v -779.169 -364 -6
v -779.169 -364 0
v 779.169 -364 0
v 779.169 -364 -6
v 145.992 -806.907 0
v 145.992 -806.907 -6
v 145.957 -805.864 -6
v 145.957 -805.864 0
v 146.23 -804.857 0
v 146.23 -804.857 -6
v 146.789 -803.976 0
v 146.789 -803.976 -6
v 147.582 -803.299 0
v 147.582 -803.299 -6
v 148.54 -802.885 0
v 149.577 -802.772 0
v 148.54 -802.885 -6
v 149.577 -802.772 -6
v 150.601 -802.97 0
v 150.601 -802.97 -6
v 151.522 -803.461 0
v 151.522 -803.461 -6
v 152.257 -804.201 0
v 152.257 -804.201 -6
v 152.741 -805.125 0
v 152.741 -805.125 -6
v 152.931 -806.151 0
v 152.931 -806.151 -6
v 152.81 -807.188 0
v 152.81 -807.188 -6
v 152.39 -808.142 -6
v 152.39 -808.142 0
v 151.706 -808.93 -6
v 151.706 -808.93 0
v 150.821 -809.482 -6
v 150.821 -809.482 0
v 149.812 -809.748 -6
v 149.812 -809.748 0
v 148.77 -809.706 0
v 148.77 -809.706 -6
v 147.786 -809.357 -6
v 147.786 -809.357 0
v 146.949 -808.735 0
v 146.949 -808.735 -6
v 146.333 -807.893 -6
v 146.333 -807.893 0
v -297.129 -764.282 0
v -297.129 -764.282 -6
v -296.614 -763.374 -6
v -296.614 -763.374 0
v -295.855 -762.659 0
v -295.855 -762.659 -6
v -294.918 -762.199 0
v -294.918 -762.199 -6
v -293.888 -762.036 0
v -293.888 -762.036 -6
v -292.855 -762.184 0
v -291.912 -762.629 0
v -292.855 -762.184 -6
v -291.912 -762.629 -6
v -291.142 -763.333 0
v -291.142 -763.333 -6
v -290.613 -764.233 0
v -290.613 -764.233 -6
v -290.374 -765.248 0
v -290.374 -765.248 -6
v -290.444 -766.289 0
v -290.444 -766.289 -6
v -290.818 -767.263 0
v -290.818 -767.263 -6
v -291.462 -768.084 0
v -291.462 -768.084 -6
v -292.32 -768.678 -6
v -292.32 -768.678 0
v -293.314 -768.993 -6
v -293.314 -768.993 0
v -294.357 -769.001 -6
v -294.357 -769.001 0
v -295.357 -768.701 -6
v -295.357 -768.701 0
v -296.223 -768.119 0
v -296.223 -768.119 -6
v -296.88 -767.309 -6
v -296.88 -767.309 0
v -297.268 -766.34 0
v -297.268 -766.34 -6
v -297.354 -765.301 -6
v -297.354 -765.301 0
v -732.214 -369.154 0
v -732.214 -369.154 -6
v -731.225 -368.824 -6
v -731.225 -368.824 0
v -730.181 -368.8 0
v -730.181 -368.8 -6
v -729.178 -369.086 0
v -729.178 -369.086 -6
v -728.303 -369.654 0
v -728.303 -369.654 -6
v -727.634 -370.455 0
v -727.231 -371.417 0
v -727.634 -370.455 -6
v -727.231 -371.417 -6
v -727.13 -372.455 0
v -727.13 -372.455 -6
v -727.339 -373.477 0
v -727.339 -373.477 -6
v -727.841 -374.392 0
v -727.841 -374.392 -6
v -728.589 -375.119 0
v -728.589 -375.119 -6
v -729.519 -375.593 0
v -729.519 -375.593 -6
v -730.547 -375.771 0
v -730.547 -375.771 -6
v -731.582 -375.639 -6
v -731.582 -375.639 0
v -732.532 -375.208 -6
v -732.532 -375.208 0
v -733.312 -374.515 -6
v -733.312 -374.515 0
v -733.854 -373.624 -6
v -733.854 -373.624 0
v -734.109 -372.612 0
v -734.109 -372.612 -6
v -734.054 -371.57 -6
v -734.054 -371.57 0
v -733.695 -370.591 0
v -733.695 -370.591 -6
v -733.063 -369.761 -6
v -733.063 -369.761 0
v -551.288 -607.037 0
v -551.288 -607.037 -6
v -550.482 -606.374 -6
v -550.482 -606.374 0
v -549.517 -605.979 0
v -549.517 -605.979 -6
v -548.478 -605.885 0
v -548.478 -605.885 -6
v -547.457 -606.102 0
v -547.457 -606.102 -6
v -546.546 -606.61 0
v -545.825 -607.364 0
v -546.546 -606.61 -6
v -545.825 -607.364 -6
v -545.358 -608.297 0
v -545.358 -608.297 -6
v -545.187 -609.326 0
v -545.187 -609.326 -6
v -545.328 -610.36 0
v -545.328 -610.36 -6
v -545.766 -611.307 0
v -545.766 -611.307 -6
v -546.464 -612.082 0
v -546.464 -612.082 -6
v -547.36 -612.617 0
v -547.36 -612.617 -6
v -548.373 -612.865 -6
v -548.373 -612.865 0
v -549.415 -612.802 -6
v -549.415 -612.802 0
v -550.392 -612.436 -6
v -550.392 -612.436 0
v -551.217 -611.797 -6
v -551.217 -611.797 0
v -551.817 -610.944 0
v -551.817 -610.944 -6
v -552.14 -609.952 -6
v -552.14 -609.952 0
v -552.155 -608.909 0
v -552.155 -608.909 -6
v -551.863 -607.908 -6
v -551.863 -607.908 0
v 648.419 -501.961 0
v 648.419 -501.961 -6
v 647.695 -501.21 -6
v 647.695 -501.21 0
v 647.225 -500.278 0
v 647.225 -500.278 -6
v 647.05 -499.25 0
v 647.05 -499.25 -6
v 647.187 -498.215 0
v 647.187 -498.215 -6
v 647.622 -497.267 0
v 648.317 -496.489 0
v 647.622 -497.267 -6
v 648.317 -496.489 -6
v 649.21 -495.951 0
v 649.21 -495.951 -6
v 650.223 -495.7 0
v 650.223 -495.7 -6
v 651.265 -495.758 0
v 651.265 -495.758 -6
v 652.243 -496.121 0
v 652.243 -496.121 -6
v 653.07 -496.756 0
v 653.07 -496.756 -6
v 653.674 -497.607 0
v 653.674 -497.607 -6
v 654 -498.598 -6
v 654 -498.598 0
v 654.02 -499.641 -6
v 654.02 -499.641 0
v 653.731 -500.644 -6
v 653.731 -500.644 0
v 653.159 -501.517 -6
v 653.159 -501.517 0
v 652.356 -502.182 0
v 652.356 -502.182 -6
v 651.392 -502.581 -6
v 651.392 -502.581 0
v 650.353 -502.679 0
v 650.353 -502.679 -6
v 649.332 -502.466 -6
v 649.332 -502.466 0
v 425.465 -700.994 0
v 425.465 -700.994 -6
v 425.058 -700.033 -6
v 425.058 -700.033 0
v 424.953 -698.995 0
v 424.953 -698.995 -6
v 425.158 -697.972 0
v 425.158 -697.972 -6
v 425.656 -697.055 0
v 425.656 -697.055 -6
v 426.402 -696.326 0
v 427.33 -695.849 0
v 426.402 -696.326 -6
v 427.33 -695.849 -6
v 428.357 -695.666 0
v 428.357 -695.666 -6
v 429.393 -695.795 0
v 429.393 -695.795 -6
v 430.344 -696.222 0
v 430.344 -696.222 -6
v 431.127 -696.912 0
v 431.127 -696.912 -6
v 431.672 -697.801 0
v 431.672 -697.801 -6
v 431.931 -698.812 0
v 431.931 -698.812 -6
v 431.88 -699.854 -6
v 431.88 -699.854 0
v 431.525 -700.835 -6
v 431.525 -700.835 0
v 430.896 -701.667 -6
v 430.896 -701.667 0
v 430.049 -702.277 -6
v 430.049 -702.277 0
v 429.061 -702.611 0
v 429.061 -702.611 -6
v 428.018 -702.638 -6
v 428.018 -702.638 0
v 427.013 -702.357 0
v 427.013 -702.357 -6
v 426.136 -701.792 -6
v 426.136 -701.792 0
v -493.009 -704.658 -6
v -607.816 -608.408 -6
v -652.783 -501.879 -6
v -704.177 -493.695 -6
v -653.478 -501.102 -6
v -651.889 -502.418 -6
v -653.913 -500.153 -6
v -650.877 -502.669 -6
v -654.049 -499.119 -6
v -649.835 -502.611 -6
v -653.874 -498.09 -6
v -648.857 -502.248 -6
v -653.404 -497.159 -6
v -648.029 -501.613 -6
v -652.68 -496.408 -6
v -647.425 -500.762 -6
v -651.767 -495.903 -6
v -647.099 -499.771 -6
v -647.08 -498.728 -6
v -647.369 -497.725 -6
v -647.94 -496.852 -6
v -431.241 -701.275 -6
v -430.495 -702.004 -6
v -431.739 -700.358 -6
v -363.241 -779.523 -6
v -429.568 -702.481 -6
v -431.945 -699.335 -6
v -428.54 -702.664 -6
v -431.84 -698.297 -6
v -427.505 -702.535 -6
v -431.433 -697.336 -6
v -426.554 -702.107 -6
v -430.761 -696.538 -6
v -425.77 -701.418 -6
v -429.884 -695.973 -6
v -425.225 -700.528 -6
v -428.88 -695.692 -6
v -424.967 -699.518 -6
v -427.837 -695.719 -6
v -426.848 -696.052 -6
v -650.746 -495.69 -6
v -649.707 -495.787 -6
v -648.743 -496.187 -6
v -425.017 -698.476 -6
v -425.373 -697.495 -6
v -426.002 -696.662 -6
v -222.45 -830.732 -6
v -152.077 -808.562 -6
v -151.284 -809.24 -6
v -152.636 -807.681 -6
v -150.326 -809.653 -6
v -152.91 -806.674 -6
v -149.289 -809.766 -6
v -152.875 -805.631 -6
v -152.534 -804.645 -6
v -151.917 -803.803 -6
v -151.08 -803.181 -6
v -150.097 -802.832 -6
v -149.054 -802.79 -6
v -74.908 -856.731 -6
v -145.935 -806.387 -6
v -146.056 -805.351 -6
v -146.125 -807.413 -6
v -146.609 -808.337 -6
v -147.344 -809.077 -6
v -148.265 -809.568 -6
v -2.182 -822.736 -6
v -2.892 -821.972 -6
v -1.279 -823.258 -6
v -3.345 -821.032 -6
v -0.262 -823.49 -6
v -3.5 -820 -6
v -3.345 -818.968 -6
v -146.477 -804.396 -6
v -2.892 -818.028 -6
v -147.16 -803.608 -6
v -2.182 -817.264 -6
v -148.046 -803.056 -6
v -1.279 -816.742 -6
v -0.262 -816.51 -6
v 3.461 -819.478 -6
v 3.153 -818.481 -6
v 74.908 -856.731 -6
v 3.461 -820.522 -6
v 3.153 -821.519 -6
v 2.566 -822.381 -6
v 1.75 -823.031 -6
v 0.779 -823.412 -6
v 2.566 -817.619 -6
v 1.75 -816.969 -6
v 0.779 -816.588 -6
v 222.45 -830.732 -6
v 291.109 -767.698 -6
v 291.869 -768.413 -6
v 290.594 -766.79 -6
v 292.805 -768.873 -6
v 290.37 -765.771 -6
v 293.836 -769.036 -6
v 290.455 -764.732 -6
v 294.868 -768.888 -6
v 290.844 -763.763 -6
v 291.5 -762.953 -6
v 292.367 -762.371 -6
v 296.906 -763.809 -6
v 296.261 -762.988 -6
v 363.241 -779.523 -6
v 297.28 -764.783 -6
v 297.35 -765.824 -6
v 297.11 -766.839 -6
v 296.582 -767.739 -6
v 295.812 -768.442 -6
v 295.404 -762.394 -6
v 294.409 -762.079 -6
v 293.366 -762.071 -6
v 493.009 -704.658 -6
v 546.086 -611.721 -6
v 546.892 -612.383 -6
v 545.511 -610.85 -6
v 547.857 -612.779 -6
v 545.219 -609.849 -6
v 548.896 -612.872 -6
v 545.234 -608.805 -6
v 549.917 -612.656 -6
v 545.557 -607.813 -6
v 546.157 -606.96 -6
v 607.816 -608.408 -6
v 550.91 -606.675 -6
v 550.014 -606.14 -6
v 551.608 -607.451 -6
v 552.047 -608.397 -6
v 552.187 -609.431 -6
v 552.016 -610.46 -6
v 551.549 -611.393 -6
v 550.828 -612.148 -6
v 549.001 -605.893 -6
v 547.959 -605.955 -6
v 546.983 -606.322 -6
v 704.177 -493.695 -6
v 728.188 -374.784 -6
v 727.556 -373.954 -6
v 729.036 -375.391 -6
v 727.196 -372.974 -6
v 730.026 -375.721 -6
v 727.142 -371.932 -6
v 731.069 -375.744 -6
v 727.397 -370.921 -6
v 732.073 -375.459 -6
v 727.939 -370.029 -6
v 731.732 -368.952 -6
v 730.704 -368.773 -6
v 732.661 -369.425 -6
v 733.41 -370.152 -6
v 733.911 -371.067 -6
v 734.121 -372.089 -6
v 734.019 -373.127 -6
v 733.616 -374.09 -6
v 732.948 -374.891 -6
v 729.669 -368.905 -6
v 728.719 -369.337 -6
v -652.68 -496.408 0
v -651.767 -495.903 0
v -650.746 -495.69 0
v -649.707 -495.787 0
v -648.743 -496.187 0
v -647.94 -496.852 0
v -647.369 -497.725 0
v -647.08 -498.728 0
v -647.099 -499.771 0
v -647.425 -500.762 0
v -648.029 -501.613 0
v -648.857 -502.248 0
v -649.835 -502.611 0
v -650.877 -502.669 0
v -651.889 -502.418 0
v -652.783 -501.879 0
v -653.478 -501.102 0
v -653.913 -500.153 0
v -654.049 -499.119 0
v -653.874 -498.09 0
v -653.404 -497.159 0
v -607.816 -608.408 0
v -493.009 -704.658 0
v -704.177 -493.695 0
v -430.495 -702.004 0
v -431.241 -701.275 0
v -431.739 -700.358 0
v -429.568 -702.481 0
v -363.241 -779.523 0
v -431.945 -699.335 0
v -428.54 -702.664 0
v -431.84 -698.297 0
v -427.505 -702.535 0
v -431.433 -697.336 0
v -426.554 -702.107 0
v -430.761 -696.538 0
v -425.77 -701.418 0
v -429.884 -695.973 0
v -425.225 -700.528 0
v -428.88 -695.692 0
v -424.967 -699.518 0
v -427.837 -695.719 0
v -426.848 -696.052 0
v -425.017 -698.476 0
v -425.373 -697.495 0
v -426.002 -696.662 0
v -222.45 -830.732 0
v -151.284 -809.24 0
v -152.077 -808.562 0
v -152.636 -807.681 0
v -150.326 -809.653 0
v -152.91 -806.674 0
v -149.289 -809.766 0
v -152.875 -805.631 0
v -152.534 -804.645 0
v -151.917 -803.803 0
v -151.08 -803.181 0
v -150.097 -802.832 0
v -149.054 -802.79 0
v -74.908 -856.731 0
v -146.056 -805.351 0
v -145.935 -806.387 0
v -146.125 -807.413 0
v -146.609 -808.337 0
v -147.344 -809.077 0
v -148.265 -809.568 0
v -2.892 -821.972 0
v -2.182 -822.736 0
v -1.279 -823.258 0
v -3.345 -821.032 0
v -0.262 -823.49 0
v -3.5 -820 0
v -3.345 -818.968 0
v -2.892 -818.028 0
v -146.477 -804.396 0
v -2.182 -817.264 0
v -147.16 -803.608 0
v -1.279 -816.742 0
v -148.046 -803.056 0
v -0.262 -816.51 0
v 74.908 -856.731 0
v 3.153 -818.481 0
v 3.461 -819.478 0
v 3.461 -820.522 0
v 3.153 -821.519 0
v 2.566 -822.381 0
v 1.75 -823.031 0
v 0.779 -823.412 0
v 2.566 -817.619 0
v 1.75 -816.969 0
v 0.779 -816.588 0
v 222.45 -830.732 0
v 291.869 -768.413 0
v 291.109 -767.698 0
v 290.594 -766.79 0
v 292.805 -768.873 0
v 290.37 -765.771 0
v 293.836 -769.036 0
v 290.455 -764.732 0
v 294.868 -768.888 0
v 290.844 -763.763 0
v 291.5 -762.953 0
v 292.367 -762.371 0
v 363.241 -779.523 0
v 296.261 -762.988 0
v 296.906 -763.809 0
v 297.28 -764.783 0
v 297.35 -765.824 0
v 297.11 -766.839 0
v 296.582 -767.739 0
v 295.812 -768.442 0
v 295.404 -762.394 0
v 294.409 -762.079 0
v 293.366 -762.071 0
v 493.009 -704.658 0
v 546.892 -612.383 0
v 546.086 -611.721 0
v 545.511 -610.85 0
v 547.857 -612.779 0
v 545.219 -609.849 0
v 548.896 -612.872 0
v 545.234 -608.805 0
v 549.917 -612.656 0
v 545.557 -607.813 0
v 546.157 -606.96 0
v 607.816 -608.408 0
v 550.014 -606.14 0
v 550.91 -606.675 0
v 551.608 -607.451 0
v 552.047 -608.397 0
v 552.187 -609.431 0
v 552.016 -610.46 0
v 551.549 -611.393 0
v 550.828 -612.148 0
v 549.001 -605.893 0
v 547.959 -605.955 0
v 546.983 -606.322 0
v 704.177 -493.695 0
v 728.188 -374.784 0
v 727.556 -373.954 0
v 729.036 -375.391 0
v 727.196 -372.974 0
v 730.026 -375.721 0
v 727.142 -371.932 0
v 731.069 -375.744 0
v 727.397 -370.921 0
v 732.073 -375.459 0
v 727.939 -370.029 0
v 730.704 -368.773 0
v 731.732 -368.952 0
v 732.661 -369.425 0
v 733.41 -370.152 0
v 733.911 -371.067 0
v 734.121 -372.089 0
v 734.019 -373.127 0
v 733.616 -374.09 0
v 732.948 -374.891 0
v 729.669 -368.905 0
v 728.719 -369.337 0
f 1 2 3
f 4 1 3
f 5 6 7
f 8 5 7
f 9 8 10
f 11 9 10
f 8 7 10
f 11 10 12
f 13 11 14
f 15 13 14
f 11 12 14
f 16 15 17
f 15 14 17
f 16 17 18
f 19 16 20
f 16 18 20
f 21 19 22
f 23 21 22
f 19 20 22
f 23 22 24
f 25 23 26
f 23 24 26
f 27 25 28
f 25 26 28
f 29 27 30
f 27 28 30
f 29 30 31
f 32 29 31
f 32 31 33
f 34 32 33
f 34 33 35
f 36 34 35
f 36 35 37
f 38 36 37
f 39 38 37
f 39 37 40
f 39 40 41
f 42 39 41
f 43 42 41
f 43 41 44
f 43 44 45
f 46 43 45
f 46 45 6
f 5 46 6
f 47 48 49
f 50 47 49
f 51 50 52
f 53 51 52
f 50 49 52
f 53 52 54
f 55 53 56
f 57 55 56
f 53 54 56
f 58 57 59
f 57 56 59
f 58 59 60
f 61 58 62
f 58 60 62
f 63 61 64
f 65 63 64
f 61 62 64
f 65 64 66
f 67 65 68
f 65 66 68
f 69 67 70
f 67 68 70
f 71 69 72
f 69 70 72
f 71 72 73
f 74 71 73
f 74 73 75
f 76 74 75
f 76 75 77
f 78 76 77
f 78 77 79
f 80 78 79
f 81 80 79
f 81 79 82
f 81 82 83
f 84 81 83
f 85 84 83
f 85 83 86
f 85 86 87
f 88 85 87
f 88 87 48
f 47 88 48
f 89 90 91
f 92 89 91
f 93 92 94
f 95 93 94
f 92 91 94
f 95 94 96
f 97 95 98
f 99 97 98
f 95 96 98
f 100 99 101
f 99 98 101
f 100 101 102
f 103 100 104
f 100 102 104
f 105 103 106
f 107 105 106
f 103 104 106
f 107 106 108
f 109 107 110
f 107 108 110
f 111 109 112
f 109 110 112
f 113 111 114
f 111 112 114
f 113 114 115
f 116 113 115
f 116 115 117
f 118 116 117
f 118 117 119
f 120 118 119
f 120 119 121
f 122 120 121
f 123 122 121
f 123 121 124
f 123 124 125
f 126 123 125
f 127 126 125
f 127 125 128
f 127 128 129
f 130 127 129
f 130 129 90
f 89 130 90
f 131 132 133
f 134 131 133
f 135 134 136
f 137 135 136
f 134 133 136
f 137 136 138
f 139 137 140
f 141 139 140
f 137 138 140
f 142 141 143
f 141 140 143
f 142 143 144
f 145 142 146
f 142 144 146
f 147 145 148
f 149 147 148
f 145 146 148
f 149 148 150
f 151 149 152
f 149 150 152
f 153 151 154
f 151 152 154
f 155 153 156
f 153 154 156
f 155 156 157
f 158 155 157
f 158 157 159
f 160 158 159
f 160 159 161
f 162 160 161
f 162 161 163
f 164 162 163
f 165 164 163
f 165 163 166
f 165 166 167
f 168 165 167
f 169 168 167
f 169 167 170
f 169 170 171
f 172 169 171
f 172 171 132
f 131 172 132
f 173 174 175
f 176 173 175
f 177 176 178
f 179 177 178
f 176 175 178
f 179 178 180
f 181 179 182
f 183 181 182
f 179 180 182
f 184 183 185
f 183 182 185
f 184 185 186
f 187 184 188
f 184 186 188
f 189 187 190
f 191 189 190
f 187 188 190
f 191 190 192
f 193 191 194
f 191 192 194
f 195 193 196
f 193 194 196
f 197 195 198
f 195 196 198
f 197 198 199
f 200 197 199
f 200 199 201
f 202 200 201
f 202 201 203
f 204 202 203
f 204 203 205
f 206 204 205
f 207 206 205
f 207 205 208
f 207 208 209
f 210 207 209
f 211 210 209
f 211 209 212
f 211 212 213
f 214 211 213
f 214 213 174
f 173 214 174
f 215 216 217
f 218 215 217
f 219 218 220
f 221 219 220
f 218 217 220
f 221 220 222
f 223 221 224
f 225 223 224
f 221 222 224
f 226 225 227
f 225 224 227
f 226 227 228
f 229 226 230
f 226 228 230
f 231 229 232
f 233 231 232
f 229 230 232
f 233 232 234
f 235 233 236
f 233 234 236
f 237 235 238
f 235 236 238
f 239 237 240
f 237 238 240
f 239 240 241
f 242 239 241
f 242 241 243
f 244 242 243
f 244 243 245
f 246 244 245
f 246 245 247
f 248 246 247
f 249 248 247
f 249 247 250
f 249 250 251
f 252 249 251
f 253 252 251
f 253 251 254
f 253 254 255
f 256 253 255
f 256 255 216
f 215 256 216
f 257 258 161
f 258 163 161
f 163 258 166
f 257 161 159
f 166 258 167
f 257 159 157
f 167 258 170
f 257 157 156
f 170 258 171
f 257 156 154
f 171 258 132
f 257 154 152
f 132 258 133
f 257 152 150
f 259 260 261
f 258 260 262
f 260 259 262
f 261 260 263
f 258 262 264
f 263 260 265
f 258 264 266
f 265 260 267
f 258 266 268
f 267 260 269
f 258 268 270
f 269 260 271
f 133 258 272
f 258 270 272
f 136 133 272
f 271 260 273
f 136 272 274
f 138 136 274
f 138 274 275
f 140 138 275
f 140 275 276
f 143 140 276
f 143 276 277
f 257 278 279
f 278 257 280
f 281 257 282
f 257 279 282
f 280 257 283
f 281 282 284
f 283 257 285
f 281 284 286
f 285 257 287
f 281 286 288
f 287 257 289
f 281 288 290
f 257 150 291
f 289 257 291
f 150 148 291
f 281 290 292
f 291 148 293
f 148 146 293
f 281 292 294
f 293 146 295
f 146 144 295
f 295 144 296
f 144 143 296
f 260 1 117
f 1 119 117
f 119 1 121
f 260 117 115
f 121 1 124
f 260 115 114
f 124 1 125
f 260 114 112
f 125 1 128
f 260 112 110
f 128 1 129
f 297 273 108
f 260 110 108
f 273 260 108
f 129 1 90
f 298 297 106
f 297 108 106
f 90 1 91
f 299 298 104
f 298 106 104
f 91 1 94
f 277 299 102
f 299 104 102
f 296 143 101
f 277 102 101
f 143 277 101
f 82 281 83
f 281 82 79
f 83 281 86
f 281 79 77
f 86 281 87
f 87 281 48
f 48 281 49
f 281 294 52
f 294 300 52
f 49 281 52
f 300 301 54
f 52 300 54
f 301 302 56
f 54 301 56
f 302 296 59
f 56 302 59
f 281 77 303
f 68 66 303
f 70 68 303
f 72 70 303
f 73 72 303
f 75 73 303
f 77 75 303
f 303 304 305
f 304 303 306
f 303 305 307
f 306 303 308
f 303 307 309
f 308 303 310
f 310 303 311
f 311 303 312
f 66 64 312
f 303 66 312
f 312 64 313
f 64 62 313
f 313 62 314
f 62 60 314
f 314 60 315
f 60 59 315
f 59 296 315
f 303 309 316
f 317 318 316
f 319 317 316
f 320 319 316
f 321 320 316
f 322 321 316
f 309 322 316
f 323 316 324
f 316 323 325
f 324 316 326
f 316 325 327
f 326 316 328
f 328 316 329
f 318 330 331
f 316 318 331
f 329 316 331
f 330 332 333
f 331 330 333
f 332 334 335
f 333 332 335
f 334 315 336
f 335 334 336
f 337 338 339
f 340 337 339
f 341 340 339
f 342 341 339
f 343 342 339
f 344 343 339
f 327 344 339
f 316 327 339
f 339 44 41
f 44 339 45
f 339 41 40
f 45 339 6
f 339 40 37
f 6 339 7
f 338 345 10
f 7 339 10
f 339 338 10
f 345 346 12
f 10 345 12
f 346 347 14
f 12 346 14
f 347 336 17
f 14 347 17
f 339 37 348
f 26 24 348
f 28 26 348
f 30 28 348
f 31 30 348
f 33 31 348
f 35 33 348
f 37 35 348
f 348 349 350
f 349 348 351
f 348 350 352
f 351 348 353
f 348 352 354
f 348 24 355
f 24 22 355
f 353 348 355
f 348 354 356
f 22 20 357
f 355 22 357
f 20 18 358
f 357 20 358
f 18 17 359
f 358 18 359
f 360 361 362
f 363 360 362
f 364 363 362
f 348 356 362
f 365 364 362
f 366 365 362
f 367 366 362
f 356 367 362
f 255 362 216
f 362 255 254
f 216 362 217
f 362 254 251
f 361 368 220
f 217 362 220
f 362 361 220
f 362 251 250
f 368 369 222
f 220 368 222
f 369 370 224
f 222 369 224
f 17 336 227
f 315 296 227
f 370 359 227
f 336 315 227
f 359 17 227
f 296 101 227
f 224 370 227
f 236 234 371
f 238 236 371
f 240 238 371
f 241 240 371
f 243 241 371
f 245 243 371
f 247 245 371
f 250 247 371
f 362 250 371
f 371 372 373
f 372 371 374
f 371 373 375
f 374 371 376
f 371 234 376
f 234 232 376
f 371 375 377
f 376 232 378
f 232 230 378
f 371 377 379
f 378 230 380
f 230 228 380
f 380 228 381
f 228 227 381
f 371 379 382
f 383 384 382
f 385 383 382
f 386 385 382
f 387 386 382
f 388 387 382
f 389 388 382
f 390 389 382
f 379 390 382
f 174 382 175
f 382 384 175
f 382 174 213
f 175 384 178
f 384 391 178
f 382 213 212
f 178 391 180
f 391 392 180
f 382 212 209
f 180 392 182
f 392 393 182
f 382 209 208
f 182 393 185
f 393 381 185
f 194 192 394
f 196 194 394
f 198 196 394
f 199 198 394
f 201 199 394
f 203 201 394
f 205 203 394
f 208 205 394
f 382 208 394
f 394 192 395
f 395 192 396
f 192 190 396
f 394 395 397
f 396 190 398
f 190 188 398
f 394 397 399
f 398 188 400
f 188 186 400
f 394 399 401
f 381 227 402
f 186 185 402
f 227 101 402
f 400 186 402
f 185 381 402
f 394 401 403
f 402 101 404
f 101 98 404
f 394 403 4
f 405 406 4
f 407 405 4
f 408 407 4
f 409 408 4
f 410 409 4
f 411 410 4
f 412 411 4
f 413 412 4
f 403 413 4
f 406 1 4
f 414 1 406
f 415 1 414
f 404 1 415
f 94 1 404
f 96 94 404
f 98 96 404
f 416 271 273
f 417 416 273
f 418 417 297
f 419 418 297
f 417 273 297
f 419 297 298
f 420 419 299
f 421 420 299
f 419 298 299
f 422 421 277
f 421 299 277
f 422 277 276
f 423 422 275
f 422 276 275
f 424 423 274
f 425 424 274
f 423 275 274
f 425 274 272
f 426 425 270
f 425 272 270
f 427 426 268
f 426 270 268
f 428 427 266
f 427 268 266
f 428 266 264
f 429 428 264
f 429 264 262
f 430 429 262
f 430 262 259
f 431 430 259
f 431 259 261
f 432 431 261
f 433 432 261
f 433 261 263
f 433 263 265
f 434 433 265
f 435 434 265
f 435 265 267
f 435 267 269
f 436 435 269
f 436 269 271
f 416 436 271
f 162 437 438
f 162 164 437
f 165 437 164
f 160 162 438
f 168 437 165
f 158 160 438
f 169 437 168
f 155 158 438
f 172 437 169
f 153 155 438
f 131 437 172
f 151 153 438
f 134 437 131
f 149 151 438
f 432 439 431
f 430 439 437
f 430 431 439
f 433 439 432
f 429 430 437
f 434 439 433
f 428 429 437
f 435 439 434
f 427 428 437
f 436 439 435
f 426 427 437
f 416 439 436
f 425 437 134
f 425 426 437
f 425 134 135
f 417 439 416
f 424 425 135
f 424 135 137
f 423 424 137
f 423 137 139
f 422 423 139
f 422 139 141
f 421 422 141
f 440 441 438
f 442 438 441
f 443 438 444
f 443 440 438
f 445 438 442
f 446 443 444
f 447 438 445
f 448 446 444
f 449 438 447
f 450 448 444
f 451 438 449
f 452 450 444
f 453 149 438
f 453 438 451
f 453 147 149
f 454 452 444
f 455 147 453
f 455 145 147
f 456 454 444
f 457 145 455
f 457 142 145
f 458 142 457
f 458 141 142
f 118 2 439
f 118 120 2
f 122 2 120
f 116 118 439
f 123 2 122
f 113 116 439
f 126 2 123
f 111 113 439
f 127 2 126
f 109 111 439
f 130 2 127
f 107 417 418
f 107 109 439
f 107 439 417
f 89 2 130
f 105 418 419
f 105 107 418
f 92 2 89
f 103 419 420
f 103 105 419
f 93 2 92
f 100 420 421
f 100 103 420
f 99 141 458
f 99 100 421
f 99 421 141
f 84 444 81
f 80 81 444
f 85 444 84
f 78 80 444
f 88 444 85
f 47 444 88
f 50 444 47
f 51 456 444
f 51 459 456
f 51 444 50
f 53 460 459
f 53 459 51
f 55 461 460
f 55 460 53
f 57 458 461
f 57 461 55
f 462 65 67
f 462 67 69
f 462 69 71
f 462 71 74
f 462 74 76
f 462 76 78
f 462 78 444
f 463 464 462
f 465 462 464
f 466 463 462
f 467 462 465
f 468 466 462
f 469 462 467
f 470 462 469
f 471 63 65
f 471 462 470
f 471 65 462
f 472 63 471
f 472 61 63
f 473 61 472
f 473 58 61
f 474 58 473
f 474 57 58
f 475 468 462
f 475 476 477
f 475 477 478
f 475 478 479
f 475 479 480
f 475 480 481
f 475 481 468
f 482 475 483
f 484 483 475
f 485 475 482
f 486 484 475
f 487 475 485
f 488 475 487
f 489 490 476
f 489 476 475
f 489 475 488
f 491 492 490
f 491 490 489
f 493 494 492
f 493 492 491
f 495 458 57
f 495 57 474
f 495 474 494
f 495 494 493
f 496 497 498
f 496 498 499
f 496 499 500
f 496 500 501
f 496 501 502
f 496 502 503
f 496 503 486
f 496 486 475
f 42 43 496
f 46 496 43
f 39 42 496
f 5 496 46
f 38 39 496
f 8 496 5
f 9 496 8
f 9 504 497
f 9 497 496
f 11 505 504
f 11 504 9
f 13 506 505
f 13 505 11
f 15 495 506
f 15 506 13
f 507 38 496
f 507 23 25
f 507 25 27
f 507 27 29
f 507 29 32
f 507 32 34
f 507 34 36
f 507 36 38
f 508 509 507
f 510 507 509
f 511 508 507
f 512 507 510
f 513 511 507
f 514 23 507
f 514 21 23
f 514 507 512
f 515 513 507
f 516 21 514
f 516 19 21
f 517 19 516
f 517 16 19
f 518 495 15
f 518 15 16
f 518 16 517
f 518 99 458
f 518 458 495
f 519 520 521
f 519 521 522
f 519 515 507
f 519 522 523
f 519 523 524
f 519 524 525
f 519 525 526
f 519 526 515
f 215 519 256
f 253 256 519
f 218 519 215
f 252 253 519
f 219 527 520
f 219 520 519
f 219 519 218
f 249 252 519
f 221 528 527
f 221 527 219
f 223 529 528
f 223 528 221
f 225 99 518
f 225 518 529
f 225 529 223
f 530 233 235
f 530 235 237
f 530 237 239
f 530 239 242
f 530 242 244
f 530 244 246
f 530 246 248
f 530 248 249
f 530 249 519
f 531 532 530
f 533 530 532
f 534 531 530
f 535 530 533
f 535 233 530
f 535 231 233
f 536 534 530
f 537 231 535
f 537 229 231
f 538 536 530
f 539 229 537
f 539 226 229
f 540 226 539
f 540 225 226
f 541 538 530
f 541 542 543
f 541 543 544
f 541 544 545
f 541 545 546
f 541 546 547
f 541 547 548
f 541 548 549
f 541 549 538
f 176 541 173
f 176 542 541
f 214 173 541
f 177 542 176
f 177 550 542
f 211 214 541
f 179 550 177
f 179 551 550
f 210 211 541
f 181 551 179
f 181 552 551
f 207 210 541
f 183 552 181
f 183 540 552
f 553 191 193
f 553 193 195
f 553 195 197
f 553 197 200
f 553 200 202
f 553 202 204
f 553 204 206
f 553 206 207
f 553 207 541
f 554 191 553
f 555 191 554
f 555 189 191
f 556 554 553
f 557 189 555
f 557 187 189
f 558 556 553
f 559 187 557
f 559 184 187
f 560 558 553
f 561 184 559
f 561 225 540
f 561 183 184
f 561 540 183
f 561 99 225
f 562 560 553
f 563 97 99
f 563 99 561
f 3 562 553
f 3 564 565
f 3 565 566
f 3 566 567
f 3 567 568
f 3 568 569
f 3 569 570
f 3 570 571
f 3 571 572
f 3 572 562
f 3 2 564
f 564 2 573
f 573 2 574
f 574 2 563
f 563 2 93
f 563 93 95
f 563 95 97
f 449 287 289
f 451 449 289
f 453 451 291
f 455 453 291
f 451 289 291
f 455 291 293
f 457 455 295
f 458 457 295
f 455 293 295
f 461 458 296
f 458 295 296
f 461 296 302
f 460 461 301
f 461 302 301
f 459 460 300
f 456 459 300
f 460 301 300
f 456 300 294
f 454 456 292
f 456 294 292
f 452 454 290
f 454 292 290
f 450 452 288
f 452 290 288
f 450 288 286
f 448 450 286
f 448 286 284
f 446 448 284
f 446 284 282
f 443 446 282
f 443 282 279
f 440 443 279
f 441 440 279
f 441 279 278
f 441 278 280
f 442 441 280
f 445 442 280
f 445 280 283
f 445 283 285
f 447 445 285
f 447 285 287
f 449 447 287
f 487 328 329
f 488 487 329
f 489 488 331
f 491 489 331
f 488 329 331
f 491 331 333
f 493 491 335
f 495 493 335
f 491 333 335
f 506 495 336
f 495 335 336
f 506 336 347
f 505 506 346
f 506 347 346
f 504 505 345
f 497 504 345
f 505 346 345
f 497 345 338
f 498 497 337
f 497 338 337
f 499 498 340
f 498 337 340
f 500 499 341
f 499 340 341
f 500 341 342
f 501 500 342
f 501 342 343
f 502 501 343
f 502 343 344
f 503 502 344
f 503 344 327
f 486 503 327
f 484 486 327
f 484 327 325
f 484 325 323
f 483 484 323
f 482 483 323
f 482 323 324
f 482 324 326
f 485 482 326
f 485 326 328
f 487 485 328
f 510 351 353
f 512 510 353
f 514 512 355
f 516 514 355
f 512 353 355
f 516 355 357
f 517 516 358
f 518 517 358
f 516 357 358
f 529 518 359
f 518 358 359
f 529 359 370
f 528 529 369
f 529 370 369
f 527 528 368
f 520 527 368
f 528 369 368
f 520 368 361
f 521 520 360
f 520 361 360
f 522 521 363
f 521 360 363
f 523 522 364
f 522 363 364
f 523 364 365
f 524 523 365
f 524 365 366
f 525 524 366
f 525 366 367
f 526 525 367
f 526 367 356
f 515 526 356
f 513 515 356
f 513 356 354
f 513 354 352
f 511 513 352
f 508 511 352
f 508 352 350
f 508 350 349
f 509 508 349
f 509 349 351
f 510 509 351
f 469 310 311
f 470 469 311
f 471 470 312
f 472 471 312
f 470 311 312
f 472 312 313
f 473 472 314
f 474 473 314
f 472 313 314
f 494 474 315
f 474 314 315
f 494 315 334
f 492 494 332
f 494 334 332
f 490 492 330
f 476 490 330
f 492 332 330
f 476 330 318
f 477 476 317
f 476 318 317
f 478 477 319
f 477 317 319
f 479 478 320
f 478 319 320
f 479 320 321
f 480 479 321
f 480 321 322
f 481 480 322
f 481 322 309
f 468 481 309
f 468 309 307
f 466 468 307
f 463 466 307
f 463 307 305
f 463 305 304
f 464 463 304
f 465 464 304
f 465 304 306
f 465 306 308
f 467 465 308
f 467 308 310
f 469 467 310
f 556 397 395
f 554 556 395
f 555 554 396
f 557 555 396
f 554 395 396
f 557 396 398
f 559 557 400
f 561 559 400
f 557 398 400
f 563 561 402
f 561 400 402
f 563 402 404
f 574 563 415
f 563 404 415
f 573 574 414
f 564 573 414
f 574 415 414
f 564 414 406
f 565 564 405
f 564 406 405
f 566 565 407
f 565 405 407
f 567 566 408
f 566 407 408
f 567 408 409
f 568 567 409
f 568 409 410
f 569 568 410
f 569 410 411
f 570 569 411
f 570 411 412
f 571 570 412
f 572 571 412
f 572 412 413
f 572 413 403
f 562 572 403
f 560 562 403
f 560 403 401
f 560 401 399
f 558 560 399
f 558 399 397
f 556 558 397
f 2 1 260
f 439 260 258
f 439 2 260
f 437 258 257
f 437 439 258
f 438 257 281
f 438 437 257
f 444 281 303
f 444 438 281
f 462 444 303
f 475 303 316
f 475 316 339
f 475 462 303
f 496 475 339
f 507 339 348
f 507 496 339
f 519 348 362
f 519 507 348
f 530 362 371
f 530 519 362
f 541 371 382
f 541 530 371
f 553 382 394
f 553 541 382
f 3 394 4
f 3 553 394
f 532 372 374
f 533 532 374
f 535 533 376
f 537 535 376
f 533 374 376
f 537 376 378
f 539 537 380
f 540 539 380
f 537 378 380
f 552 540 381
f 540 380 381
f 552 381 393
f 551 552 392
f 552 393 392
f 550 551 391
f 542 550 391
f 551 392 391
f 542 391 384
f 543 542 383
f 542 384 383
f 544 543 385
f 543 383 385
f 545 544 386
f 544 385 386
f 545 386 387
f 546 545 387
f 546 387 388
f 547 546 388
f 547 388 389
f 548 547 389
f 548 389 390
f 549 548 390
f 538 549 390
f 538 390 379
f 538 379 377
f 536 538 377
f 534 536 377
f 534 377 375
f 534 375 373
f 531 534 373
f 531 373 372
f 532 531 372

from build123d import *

# Parameters (mm, degrees)
BASE_FLANGE1_DEPTH              = 6
SKETCH2_W                       = 1968.518691842
SKETCH2_H                       = 782.123286761
CUT_EXTRUDE1_DEPTH              = 10
SKETCH3_R                       = 3.5
CUT_EXTRUDE2_DEPTH              = 10
CIRPATTERN4_COUNT               = 7
CIRPATTERN4_ANGLE               = 63
CIRPATTERN4_THE_OTHER_WAY_COUNT = 7
CIRPATTERN4_THE_OTHER_WAY_ANGLE = 63


# Sheet-metal steps are written as plain solids
with BuildPart() as part:
    # Sketch1 → Base-Flange1 (new body)
    with BuildSketch(Plane.XY):
        with BuildLine():
            Line((859.985464993, -5), (-859.985464993, -5))
            ThreePointArc((-859.985464993, -5), (0, -860), (859.985464993, -5))
        make_face()
    extrude(amount=-BASE_FLANGE1_DEPTH)

    # Sketch2 → Cut-Extrude1 (cut)
    with BuildSketch(Plane.XY):
        with Locations((10.387961435, 27.061643381)):
            Rectangle(SKETCH2_W, SKETCH2_H)
    extrude(amount=-CUT_EXTRUDE1_DEPTH, mode=Mode.SUBTRACT)

    # Sketch3 → Cut-Extrude2 (cut)
    with BuildSketch(Plane(origin=(0, 0, -6), x_dir=(-1, 0, 0), z_dir=(0, 0, -1))):
        with Locations((0, -820)):
            Circle(SKETCH3_R)
    cut_extrude2 = extrude(amount=-CUT_EXTRUDE2_DEPTH, mode=Mode.SUBTRACT)

    # CirPattern4: Cut-Extrude2 ×7 about axis
    cirpattern4_axis = Axis((0, 0, 0), (0, 0, 1))
    for i in range(1, CIRPATTERN4_COUNT):
        add(cut_extrude2.rotate(cirpattern4_axis, i * CIRPATTERN4_ANGLE / (CIRPATTERN4_COUNT - 1)), mode=Mode.SUBTRACT)

    # CirPattern4 the other way: Cut-Extrude2 ×7 about axis
    cirpattern4_the_other_way_axis = Axis((0, 0, 0), (0, 0, -1))
    for i in range(1, CIRPATTERN4_THE_OTHER_WAY_COUNT):
        add(cut_extrude2.rotate(cirpattern4_the_other_way_axis, i * CIRPATTERN4_THE_OTHER_WAY_ANGLE / (CIRPATTERN4_THE_OTHER_WAY_COUNT - 1)), mode=Mode.SUBTRACT)


solid = part.part
